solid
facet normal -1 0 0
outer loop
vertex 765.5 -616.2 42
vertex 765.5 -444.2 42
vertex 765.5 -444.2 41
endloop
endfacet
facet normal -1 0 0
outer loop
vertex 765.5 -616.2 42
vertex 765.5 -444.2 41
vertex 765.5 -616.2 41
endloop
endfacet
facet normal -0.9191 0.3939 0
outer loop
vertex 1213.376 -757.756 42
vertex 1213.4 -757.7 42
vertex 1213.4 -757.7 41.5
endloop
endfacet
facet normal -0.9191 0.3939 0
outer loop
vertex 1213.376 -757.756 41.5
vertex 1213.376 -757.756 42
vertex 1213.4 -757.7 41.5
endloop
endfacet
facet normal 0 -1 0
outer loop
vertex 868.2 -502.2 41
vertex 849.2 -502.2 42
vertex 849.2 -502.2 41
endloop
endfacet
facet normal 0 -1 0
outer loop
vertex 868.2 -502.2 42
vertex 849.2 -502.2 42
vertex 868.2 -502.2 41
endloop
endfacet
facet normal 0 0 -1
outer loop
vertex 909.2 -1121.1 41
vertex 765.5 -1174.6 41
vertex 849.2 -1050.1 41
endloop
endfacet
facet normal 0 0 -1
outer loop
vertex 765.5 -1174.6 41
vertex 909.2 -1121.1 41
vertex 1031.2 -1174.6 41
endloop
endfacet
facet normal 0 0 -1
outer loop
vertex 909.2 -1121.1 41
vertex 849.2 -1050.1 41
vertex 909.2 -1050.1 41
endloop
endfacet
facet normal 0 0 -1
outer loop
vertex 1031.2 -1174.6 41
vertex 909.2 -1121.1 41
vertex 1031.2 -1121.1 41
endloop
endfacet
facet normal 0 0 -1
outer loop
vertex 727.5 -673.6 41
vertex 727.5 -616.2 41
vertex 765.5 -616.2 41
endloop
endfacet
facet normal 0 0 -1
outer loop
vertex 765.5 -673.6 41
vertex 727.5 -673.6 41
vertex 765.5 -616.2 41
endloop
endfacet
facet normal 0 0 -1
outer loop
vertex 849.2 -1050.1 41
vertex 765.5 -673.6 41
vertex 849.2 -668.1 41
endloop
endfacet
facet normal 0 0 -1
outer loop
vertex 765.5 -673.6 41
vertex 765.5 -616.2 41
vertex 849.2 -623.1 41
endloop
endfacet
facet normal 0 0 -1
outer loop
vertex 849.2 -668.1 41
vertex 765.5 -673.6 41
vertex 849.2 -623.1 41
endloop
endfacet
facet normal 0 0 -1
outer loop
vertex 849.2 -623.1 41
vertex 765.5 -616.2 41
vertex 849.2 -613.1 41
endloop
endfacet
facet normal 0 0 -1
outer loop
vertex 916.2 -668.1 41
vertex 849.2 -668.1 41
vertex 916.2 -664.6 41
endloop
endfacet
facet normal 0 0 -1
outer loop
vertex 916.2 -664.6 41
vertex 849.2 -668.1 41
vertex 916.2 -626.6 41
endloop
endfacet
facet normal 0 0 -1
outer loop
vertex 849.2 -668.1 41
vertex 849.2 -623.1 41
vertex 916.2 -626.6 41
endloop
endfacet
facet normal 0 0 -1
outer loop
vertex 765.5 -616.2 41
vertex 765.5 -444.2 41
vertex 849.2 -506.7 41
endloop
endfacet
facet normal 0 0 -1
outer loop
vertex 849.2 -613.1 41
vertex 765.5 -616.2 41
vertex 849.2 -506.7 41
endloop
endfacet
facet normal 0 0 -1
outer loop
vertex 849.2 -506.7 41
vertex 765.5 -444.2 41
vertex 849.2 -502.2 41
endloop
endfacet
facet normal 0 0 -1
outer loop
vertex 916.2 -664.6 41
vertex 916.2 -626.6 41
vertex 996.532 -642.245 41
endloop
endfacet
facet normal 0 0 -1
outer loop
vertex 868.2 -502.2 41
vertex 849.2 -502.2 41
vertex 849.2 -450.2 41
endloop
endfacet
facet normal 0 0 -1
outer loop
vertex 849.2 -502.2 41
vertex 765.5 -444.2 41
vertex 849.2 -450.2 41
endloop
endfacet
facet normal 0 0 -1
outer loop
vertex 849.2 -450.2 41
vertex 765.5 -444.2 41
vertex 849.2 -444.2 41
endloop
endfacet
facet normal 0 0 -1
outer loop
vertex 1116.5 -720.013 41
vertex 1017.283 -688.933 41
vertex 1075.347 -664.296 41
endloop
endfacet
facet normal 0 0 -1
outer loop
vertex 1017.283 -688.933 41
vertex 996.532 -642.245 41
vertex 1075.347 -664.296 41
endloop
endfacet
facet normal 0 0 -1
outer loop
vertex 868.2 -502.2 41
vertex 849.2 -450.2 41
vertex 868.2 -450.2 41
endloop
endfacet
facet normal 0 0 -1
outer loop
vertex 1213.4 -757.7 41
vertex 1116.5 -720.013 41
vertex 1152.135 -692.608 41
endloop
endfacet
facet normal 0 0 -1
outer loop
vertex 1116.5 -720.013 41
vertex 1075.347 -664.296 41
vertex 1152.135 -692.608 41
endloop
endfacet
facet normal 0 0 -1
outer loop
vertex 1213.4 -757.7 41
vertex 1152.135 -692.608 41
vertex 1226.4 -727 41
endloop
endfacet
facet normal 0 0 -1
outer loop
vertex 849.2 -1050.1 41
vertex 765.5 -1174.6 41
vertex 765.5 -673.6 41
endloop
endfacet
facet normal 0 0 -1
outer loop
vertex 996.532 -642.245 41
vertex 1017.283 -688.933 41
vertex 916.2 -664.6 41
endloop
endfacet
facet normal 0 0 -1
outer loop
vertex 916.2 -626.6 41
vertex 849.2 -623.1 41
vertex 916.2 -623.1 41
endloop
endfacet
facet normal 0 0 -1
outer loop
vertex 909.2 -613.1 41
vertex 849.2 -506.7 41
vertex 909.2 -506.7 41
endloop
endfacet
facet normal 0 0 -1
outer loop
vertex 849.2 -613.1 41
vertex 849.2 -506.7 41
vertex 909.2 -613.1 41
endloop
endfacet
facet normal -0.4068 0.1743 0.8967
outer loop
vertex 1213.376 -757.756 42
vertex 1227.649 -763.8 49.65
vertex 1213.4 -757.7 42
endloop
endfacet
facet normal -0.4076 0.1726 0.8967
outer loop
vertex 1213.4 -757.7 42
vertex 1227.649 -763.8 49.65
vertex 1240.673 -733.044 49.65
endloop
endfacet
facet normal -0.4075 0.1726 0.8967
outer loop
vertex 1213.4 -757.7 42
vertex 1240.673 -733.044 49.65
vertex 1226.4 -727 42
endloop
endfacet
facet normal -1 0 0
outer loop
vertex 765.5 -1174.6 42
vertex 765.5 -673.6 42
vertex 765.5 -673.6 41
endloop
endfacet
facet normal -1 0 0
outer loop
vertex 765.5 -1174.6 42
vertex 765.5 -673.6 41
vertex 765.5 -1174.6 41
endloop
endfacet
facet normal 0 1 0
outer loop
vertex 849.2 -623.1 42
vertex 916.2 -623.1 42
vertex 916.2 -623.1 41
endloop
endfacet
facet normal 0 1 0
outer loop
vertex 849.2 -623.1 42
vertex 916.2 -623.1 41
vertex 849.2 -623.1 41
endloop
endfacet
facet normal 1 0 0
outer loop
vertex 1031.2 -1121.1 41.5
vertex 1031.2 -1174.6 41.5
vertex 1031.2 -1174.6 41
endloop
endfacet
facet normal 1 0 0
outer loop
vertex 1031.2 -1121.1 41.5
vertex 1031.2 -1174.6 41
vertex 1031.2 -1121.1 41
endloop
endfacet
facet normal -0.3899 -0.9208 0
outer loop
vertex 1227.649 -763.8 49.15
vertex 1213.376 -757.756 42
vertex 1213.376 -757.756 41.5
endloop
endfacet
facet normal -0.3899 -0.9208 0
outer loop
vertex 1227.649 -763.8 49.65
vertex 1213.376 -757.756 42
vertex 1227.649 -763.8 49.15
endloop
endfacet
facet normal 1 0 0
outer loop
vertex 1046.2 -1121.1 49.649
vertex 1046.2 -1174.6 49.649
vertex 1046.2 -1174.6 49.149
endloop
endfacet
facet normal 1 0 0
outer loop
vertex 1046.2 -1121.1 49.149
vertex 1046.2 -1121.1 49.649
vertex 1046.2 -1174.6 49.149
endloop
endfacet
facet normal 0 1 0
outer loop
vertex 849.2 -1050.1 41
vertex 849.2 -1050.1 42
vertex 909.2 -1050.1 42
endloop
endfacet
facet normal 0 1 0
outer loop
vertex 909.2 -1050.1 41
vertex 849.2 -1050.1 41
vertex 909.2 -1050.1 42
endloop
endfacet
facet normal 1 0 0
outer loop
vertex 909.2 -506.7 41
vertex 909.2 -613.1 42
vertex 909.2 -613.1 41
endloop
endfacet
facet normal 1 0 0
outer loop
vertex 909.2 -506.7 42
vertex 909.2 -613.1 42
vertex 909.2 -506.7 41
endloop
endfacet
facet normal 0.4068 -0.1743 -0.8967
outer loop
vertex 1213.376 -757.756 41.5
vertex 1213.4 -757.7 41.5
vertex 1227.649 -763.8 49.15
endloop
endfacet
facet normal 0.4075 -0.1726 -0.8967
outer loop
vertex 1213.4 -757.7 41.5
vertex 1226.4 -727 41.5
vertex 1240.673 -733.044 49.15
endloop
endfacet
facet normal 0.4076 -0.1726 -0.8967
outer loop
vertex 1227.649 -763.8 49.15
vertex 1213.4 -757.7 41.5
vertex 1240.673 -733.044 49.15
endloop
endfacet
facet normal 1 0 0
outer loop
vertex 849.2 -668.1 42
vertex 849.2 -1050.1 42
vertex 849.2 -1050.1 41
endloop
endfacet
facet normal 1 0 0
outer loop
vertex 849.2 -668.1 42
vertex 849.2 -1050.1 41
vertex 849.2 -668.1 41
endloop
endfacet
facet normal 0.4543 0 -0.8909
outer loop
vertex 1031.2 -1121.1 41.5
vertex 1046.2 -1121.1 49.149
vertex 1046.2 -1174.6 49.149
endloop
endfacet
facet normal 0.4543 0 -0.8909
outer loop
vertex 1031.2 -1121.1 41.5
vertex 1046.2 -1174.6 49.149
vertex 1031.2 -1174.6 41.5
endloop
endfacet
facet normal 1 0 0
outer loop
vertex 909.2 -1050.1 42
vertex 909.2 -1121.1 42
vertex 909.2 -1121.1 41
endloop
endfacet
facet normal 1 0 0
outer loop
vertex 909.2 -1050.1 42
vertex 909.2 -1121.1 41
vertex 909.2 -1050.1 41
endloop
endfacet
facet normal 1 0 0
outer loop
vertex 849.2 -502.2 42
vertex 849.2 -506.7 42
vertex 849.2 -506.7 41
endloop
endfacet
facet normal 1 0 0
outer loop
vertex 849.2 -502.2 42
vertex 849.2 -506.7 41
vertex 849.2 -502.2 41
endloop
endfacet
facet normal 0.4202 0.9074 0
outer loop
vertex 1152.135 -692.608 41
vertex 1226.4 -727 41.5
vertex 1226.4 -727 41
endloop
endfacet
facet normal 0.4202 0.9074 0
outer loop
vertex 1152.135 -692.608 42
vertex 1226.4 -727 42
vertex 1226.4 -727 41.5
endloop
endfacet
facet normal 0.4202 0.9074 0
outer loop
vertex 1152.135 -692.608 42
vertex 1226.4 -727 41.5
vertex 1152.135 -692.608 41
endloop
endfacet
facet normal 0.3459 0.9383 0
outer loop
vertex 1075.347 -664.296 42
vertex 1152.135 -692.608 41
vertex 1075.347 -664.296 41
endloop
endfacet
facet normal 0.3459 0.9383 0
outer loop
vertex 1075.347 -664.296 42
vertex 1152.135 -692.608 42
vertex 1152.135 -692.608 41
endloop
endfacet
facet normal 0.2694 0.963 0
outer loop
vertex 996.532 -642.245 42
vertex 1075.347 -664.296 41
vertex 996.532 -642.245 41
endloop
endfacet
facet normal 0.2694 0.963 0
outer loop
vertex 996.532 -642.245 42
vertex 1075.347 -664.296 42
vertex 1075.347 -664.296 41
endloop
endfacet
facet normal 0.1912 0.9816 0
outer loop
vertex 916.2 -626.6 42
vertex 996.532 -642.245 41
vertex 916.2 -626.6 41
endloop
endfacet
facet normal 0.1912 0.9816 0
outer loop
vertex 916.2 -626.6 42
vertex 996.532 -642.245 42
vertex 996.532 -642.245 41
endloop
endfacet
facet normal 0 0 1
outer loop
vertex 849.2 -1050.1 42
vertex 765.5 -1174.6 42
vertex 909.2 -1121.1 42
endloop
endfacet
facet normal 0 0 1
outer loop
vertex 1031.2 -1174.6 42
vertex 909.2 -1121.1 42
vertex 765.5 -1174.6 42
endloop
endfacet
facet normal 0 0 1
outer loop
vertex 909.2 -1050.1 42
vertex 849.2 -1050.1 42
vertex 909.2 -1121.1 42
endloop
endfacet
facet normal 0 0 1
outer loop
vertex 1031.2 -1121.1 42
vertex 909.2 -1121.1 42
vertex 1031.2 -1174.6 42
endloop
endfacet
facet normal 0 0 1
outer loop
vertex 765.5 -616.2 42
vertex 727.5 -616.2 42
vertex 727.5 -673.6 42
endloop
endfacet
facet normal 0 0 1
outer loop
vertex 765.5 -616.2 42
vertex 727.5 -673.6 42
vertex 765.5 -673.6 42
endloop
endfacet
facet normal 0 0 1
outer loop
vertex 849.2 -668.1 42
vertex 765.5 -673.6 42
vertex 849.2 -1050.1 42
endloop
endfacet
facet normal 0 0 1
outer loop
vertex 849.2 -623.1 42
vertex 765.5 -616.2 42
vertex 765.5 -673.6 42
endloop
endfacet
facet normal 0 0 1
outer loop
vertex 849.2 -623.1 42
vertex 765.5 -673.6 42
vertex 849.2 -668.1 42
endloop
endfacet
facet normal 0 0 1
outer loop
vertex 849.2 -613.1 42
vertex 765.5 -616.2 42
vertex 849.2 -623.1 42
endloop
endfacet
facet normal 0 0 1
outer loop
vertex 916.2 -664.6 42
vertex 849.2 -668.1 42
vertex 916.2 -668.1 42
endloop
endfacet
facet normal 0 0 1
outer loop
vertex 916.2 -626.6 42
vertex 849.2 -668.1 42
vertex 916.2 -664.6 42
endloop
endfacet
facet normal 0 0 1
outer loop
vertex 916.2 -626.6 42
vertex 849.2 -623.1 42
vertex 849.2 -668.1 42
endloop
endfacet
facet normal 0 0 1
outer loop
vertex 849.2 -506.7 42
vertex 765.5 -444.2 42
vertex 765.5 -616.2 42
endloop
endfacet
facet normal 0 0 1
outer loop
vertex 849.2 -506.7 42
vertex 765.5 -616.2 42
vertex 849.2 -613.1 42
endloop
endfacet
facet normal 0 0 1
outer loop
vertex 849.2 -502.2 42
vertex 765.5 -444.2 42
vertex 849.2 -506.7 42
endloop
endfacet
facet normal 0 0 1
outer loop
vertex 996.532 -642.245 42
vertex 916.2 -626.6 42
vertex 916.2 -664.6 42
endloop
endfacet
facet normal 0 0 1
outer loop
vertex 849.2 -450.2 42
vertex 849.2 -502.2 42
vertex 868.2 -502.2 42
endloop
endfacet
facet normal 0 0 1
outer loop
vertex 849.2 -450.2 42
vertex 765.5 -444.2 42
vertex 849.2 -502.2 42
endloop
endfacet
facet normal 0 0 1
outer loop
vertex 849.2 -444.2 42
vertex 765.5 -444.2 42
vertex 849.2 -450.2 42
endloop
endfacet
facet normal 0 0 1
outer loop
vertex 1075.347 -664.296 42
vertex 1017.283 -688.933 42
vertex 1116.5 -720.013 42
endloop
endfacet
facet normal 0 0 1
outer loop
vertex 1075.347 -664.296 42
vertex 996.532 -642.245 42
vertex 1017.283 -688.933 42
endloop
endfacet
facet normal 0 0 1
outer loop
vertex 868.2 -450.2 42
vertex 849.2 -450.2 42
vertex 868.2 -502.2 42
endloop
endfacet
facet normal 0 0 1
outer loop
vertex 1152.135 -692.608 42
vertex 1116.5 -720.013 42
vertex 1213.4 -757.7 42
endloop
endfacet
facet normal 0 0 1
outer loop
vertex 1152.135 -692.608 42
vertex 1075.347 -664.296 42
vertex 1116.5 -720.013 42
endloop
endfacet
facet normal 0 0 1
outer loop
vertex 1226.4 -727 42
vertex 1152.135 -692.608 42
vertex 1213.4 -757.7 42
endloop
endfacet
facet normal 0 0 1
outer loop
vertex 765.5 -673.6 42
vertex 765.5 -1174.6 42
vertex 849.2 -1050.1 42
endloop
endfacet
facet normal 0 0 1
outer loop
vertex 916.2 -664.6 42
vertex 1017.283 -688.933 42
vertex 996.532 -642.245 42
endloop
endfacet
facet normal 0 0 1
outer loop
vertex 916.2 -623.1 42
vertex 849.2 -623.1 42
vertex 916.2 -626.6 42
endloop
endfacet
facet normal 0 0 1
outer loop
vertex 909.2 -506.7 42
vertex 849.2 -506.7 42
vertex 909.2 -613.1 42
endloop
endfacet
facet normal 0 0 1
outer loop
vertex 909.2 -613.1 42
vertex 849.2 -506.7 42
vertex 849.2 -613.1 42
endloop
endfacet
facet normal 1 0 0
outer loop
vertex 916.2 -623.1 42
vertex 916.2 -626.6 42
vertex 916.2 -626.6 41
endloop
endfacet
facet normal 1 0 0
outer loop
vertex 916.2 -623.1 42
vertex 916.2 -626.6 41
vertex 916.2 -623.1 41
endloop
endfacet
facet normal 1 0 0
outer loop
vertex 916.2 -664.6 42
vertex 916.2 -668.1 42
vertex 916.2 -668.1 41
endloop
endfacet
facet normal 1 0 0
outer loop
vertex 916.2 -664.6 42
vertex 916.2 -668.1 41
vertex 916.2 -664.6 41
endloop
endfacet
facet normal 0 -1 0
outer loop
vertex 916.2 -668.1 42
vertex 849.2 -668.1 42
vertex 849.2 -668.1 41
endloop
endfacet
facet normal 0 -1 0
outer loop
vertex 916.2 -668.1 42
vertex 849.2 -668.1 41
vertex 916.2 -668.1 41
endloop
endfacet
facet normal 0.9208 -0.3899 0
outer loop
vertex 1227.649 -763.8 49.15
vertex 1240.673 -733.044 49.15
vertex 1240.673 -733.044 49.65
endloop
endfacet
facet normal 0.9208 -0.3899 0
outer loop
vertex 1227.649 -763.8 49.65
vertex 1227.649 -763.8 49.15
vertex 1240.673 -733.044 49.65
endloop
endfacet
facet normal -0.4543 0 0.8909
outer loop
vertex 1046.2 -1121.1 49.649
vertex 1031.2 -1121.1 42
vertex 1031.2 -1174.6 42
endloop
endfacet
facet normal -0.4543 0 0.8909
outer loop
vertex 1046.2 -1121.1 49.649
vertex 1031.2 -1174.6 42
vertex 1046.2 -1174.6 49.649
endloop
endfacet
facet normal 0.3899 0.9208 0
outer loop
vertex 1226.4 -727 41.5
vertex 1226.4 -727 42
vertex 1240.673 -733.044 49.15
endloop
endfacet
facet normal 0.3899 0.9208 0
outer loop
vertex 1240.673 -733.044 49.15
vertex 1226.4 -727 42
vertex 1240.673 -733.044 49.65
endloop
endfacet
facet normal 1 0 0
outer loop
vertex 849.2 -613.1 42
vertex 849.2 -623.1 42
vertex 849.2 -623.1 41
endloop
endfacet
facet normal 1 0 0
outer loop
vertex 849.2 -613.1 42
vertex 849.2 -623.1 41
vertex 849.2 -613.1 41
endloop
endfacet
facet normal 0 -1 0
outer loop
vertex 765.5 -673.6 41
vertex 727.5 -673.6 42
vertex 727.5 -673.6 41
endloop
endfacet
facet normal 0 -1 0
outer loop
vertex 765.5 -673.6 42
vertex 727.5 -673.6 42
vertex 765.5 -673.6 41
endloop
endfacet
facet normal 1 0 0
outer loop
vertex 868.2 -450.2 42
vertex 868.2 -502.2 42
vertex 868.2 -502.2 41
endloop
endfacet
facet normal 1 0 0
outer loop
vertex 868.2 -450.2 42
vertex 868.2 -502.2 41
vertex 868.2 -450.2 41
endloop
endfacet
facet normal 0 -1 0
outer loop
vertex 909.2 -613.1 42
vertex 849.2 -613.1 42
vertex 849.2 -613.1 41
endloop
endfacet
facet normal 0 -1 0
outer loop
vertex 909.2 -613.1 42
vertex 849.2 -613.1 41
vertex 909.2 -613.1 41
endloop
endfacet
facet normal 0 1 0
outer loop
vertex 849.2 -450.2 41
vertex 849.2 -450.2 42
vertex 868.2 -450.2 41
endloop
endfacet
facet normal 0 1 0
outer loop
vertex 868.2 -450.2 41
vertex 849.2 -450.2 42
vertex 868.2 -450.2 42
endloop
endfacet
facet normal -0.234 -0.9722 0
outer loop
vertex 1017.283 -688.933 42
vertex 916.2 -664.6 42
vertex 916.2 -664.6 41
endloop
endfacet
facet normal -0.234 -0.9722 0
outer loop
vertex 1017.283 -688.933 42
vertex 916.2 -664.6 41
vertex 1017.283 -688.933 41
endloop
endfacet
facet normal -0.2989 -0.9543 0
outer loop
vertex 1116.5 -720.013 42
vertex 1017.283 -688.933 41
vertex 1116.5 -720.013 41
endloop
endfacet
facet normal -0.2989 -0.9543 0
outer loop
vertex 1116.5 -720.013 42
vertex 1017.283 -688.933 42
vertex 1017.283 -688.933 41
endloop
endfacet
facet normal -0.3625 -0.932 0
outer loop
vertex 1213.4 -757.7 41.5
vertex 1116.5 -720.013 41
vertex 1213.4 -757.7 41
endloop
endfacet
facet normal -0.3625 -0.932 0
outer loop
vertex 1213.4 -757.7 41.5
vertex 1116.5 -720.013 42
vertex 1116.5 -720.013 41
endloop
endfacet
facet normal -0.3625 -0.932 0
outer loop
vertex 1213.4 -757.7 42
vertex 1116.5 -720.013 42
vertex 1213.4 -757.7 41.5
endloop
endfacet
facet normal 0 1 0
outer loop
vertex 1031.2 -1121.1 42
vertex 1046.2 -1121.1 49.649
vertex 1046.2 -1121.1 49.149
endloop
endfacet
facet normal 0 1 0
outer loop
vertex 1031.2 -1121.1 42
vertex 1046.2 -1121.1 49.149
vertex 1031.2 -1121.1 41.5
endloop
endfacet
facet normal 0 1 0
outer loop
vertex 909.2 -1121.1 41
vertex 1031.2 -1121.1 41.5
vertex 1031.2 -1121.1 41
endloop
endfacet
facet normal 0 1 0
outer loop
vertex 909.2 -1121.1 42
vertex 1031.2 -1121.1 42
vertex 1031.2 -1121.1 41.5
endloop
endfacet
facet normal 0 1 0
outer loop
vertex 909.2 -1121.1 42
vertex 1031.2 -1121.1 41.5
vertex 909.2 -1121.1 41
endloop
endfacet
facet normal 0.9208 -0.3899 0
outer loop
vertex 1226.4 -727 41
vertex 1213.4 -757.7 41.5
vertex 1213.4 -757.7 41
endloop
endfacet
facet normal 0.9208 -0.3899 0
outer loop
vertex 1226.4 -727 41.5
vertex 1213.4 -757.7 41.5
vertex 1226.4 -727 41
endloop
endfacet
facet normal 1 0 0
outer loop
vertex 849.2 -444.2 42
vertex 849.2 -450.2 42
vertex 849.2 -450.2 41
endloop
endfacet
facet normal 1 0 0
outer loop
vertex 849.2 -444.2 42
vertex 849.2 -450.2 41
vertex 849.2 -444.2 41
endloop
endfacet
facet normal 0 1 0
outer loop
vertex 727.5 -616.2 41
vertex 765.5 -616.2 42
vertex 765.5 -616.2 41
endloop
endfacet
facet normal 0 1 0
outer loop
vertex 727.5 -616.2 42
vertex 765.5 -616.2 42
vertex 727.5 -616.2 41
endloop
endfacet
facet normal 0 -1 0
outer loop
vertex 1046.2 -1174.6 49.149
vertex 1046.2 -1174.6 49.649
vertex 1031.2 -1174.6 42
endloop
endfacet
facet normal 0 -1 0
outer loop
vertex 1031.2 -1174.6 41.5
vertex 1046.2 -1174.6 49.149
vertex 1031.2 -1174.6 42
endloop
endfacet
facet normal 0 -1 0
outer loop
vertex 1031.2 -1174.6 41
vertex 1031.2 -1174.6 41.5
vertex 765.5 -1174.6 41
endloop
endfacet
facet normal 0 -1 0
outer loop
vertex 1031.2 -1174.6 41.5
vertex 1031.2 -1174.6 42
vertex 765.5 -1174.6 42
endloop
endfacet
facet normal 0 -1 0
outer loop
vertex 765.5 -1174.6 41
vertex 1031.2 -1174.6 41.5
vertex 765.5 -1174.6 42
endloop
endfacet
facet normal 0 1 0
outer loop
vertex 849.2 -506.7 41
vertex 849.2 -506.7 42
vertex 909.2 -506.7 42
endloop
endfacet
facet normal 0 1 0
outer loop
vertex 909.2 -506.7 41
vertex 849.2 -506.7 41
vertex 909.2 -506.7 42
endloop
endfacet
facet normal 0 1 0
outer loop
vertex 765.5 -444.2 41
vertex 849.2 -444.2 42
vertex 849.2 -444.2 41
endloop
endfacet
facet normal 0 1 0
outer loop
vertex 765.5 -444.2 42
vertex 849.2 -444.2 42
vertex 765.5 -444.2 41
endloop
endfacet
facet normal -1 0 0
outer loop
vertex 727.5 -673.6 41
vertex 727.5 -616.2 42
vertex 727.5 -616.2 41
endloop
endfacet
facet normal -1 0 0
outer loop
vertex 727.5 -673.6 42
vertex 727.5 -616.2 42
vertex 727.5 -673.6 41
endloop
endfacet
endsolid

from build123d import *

# Parameters (mm, degrees)
SKETCH_1_W      = 19
SKETCH_1_H      = 52
SKETCH_1_W_2    = 60
SKETCH_1_H_2    = 29.5
SKETCH_1_H_3    = 41.5
SKETCH_1_H_4    = 49.5
SKETCH_1_H_5    = 60
SKETCH_1_H_6    = 106.4
SKETCH_1_H_7    = 111
SKETCH_1_H_8    = 112
SKETCH_1_H_9    = 113
SKETCH_1_H_10   = 116.5
EXTRUDE_1_DEPTH = 1
EXTRUDE_2_DEPTH = 53.5
EXTRUDE_3_DEPTH = 33.4


with BuildPart() as part:
    # 草图1 → 拉伸1 (new body)
    with BuildSketch(Plane.XY.offset(42)):
        with Locations((858.7, -476.2)):
            Rectangle(SKETCH_1_W, SKETCH_1_H)
        with Locations((879.2, -1106.35)):
            Rectangle(SKETCH_1_W_2, SKETCH_1_H_2)
        with Locations((879.2, -1070.85)):
            Rectangle(SKETCH_1_W_2, SKETCH_1_H_3)
        with Locations((795.5, -1149.85)):
            Rectangle(SKETCH_1_W_2, SKETCH_1_H_4)
        with Locations((795.5, -474.2)):
            Rectangle(SKETCH_1_W_2, SKETCH_1_H_5)
        with Locations((879.2, -559.9)):
            Rectangle(SKETCH_1_W_2, SKETCH_1_H_6)
        with Locations((795.5, -953.1)):
            Rectangle(SKETCH_1_W_2, SKETCH_1_H_7)
        with Locations((795.5, -842.1)):
            Rectangle(SKETCH_1_W_2, SKETCH_1_H_7)
        with Locations((795.5, -560.2)):
            Rectangle(SKETCH_1_W_2, SKETCH_1_H_8)
        with Locations((795.5, -730.1)):
            Rectangle(SKETCH_1_W_2, SKETCH_1_H_9)
        with Locations((795.5, -1066.85)):
            Rectangle(SKETCH_1_W_2, SKETCH_1_H_10)
        Polygon((1031.2, -1174.6), (1031.2, -1121.1), (909.2, -1121.1), (849.2, -1121.1), (849.2, -1174.6), align=None)
        with BuildLine():
            Line((1213.4, -757.7), (1226.4, -727))
            ThreePointArc((1226.4, -727), (1075.34720829, -664.295577574), (916.2, -626.6))
            Line((916.2, -626.6), (916.2, -623.1))
            Line((916.2, -623.1), (849.2, -623.1))
            Line((849.2, -623.1), (849.2, -668.1))
            Line((849.2, -668.1), (916.2, -668.1))
            Line((916.2, -668.1), (916.2, -664.6))
            ThreePointArc((916.2, -664.6), (1067.153405165, -703.637303814), (1213.4, -757.7))
        make_face()
        Polygon((849.2, -450.2), (849.2, -444.2), (825.5, -444.2), (825.5, -504.2), (825.5, -616.2), (765.5, -616.2), (727.5, -616.2), (727.5, -673.6), (765.5, -673.6), (825.5, -673.6), (825.5, -786.6), (825.5, -897.6), (825.5, -1008.6), (825.5, -1125.1), (825.5, -1174.6), (849.2, -1174.6), (849.2, -1121.1), (849.2, -1091.6), (849.2, -1050.1), (849.2, -681.1), (849.2, -668.1), (849.2, -623.1), (849.2, -613.1), (849.2, -506.7), (849.2, -502.2), align=None)
    extrude(amount=-EXTRUDE_1_DEPTH)

    # 草图2 → 拉伸2 (add)
    with BuildSketch(Plane.XZ.offset(1174.6)):
        Polygon((1031.2, 42), (1046.2, 49.648642972), (1046.2, 49.148642972), (1031.2, 41.5), align=None)
    extrude(amount=-EXTRUDE_2_DEPTH)

    # 草图3 → 拉伸3 (add)
    with BuildSketch(Plane(origin=(1226.4, -727, 42), x_dir=(-0.9208430096491422, 0.38993352200126363, 0), z_dir=(0.38993352200126363, 0.9208430096491422, 0))):
        Polygon((0, -0.5), (-15.5, 7.15), (-15.5, 7.65), (0, 0), align=None)
    extrude(amount=-EXTRUDE_3_DEPTH)


solid = part.part
